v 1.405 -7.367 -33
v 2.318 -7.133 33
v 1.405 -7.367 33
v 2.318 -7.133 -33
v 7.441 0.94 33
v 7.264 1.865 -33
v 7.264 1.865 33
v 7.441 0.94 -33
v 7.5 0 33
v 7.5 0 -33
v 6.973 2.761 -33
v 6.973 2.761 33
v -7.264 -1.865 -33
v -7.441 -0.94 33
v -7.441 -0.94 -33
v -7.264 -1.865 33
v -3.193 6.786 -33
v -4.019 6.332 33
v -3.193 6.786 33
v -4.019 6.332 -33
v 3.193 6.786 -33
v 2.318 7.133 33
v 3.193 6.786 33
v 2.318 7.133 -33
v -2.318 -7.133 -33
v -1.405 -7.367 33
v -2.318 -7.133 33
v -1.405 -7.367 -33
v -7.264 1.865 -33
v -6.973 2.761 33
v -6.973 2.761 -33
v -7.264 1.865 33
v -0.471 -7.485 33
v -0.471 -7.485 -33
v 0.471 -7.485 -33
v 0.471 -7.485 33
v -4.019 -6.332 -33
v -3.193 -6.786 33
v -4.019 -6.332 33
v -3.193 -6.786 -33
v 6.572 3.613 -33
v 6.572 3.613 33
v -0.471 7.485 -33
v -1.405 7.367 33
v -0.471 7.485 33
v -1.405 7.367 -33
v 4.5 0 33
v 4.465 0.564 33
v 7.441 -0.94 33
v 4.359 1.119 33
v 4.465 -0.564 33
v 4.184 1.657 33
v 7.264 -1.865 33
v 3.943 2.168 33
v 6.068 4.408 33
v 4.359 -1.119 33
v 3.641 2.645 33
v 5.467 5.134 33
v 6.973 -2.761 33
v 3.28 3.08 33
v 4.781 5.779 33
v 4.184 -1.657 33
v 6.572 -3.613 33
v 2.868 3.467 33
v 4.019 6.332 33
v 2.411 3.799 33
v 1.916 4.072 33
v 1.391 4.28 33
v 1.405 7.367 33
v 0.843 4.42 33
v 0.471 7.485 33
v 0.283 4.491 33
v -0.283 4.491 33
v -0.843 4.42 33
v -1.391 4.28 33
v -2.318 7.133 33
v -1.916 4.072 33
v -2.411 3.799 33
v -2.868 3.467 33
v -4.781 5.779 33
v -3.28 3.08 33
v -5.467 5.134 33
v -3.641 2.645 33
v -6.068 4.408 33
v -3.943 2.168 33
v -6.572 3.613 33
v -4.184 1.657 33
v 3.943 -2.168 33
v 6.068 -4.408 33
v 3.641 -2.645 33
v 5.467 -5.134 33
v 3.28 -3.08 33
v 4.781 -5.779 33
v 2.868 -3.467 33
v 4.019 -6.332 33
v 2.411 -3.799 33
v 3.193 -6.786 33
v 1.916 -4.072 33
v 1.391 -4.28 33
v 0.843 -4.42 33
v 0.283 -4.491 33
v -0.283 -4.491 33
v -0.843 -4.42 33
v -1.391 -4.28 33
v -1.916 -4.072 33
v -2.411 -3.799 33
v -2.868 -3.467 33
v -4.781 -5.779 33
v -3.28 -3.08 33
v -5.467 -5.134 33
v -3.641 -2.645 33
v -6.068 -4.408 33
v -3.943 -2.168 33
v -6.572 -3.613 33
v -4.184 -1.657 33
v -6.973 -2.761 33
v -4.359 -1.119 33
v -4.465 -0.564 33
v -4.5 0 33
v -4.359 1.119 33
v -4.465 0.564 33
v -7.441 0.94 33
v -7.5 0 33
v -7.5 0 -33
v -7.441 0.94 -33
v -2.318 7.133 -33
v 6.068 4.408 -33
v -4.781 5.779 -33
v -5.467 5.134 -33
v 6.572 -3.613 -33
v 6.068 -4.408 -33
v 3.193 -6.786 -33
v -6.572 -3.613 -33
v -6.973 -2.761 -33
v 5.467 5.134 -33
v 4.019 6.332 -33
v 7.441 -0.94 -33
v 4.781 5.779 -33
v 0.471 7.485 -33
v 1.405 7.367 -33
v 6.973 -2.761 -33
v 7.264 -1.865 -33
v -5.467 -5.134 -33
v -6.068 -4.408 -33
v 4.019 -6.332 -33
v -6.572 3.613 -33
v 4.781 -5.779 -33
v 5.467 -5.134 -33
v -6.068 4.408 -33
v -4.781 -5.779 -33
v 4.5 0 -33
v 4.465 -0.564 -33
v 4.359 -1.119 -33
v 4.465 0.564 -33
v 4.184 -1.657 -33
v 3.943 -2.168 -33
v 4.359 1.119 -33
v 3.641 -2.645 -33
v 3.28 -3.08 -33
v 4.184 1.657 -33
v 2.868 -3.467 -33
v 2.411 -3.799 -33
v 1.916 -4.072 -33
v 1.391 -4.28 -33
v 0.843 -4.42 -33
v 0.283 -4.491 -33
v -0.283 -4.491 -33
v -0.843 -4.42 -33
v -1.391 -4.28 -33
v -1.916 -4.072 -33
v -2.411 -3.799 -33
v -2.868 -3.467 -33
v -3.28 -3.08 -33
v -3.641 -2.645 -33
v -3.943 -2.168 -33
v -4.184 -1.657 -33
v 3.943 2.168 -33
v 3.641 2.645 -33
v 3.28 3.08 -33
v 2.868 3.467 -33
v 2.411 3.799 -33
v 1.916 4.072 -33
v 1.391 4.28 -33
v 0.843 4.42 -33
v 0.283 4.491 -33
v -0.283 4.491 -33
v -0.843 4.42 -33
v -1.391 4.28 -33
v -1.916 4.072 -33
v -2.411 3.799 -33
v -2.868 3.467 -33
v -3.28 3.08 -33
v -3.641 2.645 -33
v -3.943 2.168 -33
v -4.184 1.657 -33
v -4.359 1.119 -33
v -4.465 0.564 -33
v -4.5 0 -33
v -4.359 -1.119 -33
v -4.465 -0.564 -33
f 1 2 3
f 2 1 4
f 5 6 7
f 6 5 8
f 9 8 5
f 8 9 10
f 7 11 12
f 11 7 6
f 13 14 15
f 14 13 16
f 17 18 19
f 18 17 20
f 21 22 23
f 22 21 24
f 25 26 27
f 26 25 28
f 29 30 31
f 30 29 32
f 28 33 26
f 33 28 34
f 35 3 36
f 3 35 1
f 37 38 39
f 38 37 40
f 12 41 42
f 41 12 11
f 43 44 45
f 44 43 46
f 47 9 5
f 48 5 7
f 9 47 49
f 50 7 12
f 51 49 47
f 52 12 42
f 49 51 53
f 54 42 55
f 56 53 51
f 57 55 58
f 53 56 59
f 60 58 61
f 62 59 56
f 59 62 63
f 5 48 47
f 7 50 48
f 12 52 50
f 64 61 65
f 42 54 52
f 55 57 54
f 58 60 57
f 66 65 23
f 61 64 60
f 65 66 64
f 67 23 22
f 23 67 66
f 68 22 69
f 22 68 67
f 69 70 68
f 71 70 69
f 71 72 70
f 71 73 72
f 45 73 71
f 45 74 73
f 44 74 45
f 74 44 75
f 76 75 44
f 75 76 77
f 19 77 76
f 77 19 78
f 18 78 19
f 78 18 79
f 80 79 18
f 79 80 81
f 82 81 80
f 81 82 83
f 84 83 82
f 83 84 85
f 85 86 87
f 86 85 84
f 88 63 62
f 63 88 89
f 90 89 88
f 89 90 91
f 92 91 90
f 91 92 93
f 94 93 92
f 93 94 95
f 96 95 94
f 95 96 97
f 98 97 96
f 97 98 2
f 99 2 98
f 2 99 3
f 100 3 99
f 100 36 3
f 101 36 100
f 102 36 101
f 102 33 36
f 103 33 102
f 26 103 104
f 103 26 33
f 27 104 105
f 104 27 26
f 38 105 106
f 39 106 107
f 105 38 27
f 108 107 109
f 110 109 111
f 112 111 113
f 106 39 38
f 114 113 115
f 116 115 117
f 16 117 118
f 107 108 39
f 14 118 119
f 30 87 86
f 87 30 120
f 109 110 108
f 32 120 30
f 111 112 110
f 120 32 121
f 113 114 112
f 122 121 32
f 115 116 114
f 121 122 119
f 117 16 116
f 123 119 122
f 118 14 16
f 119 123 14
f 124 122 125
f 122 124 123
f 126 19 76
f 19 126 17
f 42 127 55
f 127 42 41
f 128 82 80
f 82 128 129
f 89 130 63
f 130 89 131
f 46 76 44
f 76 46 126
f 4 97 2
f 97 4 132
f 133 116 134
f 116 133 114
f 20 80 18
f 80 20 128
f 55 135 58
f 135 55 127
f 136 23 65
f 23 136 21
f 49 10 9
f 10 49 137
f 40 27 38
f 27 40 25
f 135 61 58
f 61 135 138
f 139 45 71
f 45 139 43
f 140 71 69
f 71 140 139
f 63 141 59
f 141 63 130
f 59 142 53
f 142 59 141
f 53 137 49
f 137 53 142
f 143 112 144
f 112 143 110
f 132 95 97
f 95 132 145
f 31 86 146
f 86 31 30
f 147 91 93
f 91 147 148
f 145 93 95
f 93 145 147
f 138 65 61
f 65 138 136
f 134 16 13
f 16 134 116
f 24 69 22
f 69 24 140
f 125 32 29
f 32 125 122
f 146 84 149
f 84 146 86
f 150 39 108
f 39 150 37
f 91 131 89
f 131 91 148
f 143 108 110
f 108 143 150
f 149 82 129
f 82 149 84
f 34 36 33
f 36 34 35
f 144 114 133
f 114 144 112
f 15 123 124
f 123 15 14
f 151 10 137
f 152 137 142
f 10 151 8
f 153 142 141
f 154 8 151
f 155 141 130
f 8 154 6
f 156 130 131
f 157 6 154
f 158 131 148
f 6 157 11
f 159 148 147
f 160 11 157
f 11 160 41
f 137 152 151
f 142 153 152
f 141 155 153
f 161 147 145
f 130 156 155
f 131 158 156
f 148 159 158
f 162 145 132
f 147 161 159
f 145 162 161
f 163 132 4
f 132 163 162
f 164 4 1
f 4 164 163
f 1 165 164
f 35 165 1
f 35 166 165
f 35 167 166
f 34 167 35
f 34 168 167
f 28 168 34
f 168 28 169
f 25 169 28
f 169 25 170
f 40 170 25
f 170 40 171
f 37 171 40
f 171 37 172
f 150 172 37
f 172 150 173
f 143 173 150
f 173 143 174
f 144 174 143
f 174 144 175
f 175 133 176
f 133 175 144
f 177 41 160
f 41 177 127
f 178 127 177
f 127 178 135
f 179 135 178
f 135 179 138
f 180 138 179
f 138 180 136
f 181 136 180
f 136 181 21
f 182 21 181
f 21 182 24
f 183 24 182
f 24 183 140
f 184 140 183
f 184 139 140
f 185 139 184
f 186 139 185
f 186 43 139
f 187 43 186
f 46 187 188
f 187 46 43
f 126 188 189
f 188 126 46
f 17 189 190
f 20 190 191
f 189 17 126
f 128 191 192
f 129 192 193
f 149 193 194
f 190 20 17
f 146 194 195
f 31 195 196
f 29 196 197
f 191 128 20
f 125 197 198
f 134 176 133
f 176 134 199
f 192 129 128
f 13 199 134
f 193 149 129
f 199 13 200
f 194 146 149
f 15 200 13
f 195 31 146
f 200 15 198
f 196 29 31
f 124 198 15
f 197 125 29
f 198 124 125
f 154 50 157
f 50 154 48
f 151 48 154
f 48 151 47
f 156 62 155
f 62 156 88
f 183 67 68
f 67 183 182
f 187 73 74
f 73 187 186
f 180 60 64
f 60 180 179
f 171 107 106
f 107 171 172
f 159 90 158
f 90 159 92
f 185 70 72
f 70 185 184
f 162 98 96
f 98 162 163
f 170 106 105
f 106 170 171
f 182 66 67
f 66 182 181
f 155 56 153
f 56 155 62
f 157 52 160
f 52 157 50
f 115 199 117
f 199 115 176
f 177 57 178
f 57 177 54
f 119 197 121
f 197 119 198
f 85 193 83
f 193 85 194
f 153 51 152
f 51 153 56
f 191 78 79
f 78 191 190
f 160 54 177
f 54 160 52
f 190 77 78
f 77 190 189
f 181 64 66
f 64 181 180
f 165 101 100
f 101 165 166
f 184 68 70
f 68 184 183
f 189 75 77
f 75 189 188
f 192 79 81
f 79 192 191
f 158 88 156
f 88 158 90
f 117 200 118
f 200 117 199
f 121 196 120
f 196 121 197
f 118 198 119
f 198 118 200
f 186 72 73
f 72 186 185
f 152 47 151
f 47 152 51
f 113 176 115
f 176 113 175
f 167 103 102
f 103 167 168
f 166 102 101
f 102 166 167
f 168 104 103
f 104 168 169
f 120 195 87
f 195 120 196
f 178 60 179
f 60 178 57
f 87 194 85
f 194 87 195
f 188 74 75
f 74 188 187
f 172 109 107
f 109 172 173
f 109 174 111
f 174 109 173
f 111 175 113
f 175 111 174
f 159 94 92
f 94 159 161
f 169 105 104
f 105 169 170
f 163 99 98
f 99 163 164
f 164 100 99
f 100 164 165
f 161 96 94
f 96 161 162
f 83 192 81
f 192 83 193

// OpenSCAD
$fn = 50;


difference() {
	union() {
		translate(v = [0, 0, -33.0000000000]) {
			cylinder(h = 66, r = 7.5000000000);
		}
	}
	union() {
		translate(v = [0, 0, -100.0000000000]) {
			cylinder(h = 200, r = 4.5000000000);
		}
	}
}
